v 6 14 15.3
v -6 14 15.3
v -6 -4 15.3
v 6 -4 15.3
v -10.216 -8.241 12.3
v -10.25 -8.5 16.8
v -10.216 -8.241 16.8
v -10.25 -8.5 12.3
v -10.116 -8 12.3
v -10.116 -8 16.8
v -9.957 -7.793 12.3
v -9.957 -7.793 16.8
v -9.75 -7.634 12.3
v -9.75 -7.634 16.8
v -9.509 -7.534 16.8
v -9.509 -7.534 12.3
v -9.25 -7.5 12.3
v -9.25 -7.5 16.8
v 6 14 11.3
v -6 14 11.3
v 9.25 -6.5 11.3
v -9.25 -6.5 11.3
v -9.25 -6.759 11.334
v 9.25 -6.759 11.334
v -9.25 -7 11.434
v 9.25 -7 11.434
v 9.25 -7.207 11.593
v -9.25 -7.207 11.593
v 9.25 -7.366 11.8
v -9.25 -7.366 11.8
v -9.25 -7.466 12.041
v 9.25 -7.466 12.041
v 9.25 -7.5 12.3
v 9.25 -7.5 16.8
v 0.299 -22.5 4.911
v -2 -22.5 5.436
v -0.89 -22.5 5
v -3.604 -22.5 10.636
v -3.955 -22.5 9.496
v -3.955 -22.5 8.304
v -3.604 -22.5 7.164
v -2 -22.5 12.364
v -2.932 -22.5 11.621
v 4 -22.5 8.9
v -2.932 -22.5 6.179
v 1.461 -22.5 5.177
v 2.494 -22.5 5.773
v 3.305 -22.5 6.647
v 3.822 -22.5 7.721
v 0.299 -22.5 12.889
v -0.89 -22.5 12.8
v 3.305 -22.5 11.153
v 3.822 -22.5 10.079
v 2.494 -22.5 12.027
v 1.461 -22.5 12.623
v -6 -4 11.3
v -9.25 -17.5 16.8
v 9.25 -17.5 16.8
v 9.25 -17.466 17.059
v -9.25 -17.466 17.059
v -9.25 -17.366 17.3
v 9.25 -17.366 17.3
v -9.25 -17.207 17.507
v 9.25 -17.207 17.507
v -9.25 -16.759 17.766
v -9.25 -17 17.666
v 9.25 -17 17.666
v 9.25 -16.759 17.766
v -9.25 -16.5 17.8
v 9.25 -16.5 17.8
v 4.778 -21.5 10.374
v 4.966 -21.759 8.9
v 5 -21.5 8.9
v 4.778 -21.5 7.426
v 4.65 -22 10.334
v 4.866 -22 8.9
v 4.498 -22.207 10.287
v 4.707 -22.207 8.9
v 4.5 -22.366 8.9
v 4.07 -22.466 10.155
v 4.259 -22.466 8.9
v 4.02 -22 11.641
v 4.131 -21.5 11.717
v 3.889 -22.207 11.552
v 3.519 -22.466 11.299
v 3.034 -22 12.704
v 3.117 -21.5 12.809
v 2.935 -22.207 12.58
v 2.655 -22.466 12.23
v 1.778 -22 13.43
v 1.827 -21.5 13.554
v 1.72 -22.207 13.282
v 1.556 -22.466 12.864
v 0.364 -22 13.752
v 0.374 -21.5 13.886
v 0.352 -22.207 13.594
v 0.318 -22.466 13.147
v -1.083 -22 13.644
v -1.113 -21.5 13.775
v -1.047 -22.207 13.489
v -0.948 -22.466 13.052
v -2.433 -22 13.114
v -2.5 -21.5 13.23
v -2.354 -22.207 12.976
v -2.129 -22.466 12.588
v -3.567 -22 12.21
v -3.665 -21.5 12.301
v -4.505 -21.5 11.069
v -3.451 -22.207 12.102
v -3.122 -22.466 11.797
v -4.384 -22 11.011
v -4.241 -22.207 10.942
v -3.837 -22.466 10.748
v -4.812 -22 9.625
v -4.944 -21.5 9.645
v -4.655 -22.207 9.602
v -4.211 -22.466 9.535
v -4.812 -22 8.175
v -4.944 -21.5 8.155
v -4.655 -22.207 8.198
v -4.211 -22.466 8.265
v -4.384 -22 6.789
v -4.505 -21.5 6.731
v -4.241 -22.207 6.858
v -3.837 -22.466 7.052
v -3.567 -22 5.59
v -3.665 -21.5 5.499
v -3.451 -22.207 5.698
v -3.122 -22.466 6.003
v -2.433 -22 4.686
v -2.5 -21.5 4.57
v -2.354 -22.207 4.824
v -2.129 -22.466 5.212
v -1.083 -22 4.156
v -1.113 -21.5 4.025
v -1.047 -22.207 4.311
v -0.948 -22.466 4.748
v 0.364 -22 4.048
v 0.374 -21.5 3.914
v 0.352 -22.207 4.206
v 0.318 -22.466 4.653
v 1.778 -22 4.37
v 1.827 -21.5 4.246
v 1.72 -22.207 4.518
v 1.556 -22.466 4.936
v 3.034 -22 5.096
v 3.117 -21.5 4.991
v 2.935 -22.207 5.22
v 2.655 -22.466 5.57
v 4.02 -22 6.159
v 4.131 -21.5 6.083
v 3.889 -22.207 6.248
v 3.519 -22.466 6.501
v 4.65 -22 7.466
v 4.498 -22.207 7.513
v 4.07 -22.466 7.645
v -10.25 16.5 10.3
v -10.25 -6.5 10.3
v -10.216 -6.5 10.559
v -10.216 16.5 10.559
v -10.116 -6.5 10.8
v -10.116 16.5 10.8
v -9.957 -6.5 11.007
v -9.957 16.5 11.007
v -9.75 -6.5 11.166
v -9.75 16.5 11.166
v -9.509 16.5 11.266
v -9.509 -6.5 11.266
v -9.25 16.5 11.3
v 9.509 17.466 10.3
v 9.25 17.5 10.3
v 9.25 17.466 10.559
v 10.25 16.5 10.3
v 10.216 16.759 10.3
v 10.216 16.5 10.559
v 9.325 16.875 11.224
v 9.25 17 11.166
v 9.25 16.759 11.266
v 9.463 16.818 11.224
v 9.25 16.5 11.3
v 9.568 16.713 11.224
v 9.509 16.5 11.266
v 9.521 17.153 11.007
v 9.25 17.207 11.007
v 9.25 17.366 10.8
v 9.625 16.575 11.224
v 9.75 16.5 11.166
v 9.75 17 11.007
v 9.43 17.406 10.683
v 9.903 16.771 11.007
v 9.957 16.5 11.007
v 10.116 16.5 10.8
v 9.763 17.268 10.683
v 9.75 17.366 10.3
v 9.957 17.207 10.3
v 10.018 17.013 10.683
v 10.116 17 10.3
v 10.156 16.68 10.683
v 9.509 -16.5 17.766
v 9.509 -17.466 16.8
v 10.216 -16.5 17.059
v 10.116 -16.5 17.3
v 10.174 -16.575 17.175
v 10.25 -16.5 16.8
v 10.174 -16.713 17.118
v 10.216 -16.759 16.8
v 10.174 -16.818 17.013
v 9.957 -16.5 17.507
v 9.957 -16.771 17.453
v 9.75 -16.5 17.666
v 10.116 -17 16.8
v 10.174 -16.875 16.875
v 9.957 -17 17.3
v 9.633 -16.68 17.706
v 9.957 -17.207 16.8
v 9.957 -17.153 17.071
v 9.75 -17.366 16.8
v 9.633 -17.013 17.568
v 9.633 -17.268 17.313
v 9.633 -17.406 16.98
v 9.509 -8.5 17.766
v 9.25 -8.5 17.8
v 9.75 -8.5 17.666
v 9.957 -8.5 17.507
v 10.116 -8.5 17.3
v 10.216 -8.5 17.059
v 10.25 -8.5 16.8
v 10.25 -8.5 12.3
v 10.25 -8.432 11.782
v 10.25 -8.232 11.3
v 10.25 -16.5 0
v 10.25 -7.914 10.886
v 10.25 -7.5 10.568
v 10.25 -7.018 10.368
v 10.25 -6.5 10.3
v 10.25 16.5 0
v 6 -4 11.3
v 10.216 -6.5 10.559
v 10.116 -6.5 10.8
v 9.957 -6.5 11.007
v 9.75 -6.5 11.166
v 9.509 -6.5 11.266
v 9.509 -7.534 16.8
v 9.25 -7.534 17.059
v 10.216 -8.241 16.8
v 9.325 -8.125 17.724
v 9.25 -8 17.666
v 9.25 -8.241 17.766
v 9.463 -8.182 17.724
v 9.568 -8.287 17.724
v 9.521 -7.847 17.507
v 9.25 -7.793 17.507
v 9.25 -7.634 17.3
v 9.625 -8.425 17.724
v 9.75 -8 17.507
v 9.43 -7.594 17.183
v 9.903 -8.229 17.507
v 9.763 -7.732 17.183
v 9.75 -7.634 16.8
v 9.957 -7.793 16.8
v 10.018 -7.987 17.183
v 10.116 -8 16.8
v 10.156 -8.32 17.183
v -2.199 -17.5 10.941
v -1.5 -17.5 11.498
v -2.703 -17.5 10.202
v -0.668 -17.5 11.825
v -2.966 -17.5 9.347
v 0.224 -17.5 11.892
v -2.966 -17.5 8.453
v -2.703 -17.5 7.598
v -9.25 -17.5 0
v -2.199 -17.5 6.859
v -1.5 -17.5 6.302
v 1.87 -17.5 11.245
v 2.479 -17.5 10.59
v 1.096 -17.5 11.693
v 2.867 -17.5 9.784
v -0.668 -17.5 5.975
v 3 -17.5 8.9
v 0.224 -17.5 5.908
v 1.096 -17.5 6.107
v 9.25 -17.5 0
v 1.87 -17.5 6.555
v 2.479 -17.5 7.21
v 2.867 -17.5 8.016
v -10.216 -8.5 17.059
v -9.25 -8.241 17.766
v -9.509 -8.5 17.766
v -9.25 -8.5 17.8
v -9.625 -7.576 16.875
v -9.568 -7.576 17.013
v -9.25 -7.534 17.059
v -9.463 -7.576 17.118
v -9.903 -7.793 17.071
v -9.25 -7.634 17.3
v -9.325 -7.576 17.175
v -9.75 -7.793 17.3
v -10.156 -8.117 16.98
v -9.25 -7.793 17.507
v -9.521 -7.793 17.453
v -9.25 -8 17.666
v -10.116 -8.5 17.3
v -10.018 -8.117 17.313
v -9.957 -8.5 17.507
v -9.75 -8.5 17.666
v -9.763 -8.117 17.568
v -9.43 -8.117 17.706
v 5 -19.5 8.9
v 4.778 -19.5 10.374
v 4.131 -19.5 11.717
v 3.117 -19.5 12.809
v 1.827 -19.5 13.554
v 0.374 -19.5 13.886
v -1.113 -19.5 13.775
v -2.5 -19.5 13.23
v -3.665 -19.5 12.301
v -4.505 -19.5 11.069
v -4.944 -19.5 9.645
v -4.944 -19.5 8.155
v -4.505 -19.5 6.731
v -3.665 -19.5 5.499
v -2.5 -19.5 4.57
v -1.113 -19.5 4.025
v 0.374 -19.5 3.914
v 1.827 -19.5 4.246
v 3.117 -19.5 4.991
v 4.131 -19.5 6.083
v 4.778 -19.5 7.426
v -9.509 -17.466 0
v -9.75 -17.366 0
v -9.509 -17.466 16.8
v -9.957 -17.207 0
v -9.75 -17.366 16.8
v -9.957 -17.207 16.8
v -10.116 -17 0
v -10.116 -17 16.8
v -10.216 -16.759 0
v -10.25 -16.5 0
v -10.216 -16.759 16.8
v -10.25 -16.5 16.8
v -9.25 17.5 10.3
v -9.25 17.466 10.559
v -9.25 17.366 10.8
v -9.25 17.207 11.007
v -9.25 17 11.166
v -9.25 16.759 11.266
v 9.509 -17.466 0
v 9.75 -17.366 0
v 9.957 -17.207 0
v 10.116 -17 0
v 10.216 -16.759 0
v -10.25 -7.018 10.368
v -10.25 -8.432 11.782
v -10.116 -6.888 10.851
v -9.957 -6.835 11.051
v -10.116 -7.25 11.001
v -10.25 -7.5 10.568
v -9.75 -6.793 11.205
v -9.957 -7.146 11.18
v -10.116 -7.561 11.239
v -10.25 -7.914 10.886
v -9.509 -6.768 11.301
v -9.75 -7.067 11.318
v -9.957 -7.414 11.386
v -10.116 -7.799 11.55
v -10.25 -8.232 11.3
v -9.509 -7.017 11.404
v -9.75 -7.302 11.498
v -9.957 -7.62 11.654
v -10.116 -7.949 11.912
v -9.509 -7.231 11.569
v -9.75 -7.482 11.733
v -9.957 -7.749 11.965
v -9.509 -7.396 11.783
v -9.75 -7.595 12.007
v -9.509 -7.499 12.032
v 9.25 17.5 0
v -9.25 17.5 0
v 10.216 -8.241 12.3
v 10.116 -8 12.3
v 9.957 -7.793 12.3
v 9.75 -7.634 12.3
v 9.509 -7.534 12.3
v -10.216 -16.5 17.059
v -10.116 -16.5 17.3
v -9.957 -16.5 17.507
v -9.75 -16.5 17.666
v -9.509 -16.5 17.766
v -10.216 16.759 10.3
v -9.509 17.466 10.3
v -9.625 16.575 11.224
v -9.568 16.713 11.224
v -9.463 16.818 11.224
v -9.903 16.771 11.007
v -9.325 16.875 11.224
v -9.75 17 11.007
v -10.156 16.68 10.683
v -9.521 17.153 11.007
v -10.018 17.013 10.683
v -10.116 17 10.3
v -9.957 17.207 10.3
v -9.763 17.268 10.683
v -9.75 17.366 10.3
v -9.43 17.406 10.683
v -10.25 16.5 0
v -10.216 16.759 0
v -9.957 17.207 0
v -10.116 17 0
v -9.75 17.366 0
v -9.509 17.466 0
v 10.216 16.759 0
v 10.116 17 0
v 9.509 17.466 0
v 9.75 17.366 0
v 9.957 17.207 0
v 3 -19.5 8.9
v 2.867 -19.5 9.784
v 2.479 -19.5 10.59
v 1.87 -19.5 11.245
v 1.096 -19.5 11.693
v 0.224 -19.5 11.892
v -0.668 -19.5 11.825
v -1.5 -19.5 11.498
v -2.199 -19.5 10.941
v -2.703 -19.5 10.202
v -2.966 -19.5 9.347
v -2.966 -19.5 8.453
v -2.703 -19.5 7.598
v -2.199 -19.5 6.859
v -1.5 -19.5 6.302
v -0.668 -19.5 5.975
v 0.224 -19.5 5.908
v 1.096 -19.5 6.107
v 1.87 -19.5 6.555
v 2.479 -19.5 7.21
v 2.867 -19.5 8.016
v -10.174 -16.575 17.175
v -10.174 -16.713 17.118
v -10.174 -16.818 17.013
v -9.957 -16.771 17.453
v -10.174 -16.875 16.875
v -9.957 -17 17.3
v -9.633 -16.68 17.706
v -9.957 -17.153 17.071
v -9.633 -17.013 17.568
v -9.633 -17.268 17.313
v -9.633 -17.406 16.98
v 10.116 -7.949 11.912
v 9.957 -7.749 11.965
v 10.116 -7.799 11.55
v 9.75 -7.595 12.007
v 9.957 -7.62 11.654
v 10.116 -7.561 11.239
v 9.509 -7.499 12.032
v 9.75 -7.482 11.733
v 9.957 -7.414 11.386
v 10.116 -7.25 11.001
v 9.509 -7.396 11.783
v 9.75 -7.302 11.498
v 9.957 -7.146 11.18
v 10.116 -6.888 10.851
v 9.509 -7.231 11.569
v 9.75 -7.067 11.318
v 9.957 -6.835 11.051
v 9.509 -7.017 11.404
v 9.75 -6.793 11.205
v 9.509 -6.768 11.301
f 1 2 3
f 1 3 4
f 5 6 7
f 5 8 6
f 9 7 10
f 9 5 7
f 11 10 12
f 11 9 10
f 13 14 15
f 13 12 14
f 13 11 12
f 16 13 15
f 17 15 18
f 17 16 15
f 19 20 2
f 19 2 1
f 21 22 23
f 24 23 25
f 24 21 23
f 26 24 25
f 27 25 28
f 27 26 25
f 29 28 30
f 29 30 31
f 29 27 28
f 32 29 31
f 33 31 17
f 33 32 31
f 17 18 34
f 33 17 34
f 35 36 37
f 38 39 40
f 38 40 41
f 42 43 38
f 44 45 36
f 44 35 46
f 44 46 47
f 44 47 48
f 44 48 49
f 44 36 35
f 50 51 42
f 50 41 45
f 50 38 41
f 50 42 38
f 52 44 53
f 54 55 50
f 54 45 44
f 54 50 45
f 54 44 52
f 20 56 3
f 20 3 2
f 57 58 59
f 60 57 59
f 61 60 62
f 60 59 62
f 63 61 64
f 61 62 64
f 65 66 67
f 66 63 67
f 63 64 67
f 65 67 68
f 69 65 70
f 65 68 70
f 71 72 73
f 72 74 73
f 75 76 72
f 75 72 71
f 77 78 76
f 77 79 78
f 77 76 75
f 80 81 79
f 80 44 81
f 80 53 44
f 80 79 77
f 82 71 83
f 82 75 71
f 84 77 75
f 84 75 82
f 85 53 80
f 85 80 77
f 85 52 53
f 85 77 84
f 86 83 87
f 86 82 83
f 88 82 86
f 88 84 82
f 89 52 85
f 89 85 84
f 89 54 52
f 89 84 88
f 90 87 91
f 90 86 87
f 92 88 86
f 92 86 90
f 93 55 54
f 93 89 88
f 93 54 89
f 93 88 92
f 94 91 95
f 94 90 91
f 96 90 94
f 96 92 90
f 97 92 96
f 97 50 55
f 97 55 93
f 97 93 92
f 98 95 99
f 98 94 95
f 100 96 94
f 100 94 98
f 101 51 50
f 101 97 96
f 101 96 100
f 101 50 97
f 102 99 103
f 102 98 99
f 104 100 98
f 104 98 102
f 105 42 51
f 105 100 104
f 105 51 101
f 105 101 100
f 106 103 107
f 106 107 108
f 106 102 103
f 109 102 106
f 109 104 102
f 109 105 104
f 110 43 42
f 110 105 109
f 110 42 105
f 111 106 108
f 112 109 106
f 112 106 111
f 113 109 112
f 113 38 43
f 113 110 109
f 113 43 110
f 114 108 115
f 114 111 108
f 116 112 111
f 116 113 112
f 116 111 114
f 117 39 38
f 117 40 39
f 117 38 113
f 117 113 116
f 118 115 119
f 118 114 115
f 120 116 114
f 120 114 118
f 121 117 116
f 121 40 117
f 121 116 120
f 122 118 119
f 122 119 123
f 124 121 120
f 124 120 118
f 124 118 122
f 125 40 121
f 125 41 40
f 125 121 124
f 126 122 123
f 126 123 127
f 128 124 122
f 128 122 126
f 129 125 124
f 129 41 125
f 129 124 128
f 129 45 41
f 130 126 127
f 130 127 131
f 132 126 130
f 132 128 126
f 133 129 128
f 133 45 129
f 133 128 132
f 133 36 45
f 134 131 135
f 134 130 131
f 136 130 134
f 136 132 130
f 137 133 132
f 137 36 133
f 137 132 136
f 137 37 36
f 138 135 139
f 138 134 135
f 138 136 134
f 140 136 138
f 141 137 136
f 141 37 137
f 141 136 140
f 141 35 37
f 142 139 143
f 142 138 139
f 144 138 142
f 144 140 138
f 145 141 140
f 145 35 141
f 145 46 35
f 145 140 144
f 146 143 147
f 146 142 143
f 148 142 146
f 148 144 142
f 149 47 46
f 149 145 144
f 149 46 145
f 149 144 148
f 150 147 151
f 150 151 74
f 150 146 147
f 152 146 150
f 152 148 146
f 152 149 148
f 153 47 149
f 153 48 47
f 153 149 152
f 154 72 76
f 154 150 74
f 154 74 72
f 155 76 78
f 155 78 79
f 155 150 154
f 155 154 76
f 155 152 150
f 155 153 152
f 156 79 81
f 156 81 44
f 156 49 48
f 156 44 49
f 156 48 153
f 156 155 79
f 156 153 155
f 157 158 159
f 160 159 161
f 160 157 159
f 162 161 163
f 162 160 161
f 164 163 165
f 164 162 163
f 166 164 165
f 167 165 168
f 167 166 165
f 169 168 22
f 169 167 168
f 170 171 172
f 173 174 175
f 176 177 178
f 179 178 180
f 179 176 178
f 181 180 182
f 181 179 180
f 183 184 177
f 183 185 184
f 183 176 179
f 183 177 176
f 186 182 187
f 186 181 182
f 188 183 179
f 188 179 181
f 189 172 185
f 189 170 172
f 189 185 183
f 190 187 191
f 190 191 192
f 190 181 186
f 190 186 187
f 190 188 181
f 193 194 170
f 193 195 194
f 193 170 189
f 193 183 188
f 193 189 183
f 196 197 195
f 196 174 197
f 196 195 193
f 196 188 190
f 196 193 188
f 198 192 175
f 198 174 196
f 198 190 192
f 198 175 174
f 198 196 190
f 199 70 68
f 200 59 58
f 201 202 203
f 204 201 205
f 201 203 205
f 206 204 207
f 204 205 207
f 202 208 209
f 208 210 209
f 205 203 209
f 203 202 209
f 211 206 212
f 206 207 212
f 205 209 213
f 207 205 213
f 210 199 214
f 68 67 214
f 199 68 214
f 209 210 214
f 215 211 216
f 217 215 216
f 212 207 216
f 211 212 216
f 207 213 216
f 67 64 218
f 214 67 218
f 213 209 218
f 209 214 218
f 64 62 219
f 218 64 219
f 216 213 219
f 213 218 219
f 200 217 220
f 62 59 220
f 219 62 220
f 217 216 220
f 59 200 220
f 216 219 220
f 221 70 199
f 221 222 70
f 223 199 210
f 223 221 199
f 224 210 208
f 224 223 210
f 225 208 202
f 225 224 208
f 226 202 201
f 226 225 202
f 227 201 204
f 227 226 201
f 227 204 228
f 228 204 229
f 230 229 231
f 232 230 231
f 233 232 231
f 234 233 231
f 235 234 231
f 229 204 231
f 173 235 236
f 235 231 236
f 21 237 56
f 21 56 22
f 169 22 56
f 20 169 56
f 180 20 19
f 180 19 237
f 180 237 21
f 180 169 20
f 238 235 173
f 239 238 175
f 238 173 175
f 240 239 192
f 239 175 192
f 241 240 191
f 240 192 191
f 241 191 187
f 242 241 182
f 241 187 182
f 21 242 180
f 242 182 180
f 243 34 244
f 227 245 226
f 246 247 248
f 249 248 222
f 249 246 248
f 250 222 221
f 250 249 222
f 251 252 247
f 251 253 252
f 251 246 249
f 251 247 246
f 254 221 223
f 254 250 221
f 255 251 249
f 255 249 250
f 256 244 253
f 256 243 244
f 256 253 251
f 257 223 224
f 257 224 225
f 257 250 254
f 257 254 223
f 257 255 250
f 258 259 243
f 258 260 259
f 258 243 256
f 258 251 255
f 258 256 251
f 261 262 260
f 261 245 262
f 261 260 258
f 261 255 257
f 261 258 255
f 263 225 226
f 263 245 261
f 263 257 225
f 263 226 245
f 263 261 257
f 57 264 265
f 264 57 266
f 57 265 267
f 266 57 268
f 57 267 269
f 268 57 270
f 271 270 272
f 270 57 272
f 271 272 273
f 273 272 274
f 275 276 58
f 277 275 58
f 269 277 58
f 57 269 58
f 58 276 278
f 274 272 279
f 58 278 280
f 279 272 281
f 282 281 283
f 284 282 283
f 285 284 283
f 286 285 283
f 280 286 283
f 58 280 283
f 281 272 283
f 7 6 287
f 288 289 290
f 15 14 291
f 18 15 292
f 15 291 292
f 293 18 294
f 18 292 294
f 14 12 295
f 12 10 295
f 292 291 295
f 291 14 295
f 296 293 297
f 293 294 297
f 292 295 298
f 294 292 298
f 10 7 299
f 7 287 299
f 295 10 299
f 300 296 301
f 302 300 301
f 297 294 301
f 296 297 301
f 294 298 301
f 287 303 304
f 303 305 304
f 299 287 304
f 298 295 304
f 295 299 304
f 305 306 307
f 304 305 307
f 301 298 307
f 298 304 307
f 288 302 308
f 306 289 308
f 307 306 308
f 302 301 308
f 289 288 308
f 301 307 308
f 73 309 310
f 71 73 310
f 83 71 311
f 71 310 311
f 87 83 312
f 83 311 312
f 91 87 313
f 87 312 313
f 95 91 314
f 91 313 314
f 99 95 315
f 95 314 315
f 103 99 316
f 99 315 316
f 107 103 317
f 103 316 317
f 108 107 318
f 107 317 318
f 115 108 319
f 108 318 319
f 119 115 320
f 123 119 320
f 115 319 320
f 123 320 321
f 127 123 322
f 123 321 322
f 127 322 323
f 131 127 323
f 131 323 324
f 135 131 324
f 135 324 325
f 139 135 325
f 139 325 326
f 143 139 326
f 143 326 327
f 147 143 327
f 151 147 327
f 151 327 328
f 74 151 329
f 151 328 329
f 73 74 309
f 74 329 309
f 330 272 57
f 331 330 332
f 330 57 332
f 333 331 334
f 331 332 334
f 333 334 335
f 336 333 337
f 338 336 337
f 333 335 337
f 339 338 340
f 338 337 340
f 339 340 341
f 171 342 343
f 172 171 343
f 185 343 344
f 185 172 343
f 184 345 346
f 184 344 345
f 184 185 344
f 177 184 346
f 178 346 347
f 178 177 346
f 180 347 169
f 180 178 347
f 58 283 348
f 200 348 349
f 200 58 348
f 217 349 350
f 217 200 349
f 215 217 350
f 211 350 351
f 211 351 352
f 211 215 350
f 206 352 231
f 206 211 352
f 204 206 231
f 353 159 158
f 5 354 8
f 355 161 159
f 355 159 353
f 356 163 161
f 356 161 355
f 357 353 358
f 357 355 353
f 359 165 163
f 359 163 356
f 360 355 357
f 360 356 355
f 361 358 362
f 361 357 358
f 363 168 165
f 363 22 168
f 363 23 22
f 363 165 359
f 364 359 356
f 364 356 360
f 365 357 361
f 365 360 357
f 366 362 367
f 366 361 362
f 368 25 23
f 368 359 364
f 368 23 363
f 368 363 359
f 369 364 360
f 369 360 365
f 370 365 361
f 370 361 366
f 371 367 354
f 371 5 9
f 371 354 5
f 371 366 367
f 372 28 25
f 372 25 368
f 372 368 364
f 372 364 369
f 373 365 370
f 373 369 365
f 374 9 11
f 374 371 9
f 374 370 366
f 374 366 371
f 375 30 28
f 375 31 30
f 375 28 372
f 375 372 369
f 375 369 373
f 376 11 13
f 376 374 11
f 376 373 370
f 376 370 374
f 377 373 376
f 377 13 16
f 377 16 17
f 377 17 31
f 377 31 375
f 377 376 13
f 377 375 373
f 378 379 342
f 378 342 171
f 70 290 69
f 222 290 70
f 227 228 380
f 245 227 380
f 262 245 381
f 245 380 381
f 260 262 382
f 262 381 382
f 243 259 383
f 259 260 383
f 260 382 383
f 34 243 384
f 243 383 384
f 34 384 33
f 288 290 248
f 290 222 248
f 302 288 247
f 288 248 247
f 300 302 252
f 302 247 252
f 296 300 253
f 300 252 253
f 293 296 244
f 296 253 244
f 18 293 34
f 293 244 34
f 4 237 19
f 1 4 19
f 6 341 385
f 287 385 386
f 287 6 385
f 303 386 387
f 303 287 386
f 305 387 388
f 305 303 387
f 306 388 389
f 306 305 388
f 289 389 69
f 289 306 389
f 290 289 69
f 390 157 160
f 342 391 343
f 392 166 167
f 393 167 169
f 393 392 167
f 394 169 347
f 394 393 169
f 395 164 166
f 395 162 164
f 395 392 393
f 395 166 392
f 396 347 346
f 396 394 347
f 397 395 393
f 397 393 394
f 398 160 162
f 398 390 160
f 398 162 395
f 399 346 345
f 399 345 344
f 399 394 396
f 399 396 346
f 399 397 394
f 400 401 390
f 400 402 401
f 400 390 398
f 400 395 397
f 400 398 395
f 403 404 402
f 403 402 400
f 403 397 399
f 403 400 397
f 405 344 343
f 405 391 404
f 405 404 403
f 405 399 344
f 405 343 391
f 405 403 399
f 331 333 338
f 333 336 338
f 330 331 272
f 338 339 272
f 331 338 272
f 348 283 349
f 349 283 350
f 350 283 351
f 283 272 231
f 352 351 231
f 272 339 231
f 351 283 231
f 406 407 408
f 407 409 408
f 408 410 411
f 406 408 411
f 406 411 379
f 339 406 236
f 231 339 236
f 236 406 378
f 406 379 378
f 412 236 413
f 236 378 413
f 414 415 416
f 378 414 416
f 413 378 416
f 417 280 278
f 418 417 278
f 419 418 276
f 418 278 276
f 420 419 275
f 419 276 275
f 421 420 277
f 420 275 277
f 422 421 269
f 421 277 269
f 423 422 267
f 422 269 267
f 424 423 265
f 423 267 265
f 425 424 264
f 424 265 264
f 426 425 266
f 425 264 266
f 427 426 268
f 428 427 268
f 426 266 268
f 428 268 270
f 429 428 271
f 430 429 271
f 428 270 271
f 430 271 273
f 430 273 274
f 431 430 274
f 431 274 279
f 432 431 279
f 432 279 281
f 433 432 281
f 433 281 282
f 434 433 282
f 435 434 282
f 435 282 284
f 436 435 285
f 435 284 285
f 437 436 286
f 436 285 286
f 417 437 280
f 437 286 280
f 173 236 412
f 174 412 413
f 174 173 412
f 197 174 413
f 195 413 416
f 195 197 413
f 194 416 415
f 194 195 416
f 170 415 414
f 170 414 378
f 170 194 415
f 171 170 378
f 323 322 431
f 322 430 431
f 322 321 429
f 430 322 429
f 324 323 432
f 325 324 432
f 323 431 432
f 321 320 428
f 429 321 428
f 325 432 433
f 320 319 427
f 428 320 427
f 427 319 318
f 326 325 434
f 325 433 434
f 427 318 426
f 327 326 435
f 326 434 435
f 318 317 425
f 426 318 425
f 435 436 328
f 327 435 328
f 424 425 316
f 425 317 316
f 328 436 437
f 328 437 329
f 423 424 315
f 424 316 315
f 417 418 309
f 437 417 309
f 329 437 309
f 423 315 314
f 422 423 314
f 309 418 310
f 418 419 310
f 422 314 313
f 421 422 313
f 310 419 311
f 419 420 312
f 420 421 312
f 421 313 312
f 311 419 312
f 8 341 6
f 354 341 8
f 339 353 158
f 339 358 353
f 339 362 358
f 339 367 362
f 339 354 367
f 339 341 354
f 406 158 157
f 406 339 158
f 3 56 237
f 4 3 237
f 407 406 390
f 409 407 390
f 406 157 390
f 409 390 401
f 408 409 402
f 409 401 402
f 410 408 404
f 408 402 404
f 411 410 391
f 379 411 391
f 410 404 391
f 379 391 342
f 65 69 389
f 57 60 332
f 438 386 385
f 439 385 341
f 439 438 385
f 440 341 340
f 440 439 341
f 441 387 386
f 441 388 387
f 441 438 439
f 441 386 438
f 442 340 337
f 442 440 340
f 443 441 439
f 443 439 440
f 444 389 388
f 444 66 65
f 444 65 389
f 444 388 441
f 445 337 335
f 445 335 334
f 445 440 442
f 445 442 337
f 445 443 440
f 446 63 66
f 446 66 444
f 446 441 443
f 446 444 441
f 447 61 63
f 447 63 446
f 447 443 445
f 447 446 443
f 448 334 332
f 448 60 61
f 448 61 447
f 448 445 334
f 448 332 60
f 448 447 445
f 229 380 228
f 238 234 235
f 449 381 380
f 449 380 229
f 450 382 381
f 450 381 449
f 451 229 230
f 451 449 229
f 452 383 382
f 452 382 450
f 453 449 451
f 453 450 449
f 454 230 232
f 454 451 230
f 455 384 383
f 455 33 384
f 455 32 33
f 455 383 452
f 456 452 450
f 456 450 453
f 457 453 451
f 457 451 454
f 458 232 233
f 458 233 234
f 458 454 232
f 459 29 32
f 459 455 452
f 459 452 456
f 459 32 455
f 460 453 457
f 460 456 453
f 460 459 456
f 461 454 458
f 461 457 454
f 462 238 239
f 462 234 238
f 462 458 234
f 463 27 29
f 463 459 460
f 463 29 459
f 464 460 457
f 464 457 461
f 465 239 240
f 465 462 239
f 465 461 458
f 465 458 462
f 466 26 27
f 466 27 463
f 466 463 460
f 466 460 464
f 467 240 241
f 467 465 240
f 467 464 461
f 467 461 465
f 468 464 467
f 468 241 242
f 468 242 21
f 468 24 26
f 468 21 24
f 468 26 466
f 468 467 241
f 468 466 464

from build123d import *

# Parameters (mm, degrees)
SKETCH_1_W          = 20.5
SKETCH_1_H          = 35
EXTRUDE_1_DEPTH     = 17.8
SKETCH_3_R          = 3
EXTRUDE_2_DEPTH     = 2
SKETCH_4_R          = 5
EXTRUDE_3_DEPTH     = 3
SKETCH_5_W          = 20.5
SKETCH_5_H          = 25
CUT_EXTRUDE_1_DEPTH = 6.5
FILLET_1_R          = 1
SKETCH_6_W          = 12
SKETCH_6_H          = 18
EXTRUDE_4_DEPTH     = 4


with BuildPart() as part:
    # 草圖1 → 填料-伸長1 (new body)
    with BuildSketch(Plane.XY):
        Rectangle(SKETCH_1_W, SKETCH_1_H)
    extrude(amount=EXTRUDE_1_DEPTH)

    # 草圖3 → 填料-伸長2 (add)
    with BuildSketch(Plane.XZ.offset(17.5)):
        with Locations((0, 8.9)):
            Circle(SKETCH_3_R)
    extrude(amount=EXTRUDE_2_DEPTH)

    # 草圖4 → 填料-伸長3 (add)
    with BuildSketch(Plane.XZ.offset(19.5)):
        with Locations((0, 8.9)):
            Circle(SKETCH_4_R)
    extrude(amount=EXTRUDE_3_DEPTH)

    # 草圖5 → 除料-伸長1 (cut)
    with BuildSketch(Plane.XY.offset(17.8)):
        with Locations((0, 5)):
            Rectangle(SKETCH_5_W, SKETCH_5_H)
    extrude(amount=-CUT_EXTRUDE_1_DEPTH, mode=Mode.SUBTRACT)

    # 圓角1
    fillet_1_edges = [part.edges().sort_by_distance(p)[0] for p in [
        (0, -17.5, 17.8),
        (-5, -22.5, 8.9),
        (-10.25, -12.5, 17.8),
        (-10.25, 17.5, 5.65),
        (10.25, 17.5, 5.65),
        (-10.25, 5, 11.3),
        (-10.25, -7.5, 14.55),
        (0, 17.5, 11.3),
        (10.25, 5, 11.3),
        (0, -7.5, 11.3),
        (10.25, -7.5, 14.55),
        (0, -7.5, 17.8),
        (10.25, -12.5, 17.8),
        (10.25, -17.5, 8.9),
        (-10.25, -17.5, 8.9),
    ]]
    fillet(fillet_1_edges, radius=FILLET_1_R)

    # 草圖6 → 填料-伸長4 (add)
    with BuildSketch(Plane.XY.offset(11.3)):
        with Locations((0, 5)):
            Rectangle(SKETCH_6_W, SKETCH_6_H)
    extrude(amount=EXTRUDE_4_DEPTH)


solid = part.part
